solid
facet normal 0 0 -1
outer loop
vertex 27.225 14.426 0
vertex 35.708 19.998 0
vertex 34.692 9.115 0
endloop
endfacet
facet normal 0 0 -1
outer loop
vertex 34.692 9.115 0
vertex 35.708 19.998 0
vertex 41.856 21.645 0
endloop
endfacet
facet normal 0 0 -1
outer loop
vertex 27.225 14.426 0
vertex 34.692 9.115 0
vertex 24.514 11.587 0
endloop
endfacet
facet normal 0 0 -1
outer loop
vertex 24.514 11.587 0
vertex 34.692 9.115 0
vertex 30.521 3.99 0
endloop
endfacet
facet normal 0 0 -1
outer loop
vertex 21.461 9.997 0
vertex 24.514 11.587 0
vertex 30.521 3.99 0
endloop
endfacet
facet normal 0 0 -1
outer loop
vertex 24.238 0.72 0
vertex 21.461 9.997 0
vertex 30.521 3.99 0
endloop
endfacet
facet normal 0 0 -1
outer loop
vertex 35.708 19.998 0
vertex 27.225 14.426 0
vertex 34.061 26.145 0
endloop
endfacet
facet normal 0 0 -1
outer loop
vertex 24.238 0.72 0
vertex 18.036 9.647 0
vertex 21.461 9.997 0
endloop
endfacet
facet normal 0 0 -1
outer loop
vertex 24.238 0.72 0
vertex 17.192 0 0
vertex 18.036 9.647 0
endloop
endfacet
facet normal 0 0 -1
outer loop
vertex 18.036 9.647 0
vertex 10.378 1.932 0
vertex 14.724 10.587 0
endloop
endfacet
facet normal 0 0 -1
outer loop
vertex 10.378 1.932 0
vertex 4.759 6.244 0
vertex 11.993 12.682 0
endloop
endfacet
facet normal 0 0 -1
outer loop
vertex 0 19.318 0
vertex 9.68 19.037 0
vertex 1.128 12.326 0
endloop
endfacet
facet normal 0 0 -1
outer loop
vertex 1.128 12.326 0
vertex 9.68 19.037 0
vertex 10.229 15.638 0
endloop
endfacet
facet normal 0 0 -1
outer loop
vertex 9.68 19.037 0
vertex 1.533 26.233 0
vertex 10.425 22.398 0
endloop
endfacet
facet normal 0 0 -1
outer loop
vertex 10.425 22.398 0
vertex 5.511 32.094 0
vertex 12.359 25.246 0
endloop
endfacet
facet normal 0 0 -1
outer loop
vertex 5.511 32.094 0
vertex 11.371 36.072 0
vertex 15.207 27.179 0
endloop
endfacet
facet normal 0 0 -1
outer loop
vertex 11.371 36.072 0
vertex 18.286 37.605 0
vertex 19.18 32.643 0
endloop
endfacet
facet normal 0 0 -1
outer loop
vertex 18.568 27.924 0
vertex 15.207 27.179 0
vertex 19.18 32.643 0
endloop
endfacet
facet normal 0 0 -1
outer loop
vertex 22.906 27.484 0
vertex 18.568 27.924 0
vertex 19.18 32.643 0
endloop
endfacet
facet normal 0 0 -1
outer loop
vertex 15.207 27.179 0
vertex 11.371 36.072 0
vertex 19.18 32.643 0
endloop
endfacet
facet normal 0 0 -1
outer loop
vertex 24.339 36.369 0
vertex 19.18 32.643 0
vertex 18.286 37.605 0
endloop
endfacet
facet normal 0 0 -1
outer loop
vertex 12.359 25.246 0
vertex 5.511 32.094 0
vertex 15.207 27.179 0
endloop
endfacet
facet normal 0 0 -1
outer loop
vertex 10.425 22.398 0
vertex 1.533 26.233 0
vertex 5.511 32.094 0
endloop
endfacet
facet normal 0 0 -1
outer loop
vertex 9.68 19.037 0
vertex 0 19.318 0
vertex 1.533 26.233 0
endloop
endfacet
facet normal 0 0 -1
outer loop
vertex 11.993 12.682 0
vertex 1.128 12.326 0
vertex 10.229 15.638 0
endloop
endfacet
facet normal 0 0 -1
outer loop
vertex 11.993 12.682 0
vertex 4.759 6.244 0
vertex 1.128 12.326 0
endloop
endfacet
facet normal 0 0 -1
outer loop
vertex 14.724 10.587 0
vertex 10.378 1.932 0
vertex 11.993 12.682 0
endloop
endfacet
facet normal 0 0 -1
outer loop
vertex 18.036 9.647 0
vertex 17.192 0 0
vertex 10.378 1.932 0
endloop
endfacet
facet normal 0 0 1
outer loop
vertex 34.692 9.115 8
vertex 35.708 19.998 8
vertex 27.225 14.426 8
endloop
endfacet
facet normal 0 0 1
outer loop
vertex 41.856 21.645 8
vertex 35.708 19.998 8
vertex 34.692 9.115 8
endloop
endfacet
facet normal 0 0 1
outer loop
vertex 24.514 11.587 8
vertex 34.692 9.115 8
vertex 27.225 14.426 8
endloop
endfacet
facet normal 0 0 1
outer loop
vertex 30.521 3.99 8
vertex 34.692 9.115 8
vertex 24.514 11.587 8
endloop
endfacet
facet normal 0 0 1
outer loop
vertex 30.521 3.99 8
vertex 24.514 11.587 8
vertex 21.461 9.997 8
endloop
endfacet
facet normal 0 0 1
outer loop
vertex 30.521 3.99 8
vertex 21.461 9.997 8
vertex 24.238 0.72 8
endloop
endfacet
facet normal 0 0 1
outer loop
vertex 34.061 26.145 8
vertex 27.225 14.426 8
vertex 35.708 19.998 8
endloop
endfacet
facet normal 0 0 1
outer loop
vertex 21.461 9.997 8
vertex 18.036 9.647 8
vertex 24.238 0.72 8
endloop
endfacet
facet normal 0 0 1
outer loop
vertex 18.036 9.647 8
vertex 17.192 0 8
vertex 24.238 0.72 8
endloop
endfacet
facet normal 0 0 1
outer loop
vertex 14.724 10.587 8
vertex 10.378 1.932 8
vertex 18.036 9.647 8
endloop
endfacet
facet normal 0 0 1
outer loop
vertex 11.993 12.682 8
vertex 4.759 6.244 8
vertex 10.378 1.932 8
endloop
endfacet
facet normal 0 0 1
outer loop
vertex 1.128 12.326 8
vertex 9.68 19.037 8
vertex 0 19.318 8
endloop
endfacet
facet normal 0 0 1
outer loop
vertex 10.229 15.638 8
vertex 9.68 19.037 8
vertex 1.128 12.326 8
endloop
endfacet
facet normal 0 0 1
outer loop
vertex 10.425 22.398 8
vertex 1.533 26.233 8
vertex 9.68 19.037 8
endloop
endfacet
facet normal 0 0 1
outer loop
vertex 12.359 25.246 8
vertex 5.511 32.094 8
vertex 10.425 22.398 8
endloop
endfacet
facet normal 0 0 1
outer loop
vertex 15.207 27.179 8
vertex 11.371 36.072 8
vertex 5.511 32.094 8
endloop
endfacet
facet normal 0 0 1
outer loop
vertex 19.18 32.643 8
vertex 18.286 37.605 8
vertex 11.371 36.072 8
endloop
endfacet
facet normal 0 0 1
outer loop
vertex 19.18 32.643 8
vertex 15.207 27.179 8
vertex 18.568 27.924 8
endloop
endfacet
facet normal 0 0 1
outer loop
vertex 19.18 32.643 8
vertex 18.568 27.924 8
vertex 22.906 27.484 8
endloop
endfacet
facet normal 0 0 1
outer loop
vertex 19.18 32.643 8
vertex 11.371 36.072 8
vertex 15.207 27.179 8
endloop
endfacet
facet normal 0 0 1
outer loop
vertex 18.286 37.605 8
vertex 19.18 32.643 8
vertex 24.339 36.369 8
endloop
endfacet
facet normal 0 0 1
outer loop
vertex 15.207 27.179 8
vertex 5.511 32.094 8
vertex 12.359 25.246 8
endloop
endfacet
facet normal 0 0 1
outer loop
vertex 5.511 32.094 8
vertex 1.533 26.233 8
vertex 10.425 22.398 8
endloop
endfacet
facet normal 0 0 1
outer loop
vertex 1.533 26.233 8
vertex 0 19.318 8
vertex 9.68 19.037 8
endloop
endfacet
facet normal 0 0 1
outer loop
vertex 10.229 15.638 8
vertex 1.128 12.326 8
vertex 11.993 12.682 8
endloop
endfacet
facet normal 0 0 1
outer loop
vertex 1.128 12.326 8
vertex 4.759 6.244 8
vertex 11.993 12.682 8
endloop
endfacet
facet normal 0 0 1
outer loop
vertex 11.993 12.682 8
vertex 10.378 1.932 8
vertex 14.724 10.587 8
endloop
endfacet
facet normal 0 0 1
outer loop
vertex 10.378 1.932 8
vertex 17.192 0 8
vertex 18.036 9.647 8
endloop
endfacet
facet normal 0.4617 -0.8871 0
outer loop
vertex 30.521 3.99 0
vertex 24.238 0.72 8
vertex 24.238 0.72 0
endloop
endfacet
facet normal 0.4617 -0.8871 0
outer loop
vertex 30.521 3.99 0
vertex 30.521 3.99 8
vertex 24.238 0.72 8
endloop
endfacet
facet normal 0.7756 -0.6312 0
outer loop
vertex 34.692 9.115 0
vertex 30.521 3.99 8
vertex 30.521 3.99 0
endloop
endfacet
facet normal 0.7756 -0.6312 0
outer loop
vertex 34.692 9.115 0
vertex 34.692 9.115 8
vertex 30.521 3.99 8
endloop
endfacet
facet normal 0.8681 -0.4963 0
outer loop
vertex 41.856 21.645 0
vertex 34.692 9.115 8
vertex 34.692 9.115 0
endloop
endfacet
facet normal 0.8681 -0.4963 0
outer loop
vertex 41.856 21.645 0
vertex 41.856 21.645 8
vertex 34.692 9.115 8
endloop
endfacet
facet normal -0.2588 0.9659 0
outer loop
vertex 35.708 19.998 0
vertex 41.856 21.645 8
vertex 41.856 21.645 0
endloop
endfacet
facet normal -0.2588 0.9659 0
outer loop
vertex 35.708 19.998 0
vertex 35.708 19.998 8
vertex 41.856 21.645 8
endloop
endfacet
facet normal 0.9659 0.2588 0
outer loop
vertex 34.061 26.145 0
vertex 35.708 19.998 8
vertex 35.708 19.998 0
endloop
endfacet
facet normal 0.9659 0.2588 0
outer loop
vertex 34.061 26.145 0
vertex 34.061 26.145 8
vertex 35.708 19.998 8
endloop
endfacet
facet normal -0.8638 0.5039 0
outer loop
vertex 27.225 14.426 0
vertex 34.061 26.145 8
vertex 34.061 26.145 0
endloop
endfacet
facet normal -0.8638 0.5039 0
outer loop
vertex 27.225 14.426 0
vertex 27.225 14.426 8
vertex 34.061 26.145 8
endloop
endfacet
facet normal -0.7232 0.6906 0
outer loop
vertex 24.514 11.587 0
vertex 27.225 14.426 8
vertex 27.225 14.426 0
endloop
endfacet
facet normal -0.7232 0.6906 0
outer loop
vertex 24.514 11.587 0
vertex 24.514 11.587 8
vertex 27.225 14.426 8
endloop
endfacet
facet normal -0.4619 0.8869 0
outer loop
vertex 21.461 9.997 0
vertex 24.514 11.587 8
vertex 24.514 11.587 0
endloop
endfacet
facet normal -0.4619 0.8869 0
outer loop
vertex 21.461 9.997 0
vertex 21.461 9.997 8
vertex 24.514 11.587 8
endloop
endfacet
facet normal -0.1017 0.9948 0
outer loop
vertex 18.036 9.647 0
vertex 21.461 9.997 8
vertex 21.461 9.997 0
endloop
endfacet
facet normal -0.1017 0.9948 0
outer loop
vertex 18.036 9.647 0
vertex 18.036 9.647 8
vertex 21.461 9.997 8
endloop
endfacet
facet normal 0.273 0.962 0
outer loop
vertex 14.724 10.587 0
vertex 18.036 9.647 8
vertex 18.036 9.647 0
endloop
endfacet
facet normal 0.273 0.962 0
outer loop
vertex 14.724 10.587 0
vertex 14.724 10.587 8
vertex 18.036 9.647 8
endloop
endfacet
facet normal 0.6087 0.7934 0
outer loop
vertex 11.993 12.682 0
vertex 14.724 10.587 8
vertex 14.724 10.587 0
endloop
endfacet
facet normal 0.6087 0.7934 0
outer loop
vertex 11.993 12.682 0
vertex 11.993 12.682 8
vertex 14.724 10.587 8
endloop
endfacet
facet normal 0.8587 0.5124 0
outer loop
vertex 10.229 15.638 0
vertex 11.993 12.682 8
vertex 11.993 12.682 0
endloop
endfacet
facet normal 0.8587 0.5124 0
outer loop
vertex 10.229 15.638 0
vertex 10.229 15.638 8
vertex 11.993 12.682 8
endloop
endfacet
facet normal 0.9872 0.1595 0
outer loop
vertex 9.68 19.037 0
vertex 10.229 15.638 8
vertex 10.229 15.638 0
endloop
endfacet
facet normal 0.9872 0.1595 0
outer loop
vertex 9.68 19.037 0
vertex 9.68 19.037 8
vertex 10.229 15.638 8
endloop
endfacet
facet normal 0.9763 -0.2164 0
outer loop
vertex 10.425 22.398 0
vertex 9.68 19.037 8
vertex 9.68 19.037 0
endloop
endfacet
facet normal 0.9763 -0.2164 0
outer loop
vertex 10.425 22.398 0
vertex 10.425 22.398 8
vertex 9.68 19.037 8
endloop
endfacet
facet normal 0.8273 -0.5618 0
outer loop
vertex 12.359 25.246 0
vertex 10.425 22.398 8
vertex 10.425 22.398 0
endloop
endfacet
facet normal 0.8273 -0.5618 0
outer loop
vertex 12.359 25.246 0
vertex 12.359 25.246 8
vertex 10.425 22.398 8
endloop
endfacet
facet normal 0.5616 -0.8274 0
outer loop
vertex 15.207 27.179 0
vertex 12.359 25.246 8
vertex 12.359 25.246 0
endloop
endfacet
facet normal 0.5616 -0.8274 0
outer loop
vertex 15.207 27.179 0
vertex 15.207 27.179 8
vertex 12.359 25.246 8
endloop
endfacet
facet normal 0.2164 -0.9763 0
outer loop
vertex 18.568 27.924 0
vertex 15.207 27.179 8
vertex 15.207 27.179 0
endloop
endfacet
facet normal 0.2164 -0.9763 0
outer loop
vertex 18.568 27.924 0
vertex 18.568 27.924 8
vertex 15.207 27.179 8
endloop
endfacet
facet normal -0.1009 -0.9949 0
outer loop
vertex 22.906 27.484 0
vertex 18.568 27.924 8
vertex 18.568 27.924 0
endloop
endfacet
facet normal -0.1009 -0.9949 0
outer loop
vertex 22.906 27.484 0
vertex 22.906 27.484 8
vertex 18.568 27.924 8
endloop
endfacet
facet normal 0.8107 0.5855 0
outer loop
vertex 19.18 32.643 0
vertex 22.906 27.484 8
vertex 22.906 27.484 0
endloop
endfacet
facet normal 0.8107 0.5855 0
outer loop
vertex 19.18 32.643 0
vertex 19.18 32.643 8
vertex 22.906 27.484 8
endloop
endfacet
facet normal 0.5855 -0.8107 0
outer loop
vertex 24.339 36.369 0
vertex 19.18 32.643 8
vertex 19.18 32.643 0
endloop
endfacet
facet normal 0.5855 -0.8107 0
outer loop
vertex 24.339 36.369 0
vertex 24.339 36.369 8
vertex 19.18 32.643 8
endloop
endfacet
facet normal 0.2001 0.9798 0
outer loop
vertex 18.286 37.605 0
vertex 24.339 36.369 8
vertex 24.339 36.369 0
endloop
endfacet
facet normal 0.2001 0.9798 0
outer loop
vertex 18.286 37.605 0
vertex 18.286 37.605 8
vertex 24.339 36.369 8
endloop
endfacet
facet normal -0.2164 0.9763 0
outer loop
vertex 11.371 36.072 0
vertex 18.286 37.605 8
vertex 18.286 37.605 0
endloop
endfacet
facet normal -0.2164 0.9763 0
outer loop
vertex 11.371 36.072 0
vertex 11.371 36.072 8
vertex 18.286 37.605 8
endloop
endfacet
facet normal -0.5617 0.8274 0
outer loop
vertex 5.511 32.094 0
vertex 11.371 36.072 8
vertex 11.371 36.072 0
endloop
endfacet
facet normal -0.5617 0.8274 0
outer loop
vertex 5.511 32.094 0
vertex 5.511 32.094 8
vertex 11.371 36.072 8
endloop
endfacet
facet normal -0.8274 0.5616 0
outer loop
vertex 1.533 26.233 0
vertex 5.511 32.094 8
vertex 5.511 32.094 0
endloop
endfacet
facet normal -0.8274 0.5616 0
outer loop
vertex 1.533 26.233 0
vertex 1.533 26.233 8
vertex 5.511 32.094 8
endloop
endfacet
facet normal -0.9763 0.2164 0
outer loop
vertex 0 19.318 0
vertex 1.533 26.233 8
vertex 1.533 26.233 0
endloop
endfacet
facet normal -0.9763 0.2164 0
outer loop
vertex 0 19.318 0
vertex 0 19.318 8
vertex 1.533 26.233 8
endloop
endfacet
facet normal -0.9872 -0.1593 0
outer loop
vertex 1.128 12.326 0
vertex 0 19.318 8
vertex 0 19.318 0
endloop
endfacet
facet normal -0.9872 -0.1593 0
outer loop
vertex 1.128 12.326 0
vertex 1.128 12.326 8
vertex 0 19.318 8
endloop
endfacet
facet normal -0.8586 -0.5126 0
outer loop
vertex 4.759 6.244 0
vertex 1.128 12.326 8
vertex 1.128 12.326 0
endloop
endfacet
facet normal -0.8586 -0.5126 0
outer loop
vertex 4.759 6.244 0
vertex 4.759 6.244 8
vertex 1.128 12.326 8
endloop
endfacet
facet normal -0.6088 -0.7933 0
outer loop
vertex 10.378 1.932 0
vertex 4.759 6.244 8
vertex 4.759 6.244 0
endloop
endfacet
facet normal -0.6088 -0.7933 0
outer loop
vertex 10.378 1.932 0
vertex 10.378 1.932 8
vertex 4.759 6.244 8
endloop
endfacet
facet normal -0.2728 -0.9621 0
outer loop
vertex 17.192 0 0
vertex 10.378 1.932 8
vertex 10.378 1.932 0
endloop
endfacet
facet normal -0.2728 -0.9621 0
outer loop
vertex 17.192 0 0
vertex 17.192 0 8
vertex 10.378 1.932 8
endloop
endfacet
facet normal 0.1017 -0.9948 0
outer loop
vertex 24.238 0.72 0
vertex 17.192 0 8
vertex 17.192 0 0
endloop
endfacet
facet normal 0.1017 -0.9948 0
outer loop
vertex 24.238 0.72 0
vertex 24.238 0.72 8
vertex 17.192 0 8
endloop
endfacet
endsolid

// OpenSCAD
$fn = 32;

// ----------------------------------------------------------------------
// Eye lug: ring_tail, 8 mm thick
// ----------------------------------------------------------------------

// --- parameters (mm) ---
profile_height = 8;       // extrusion height
profile_points = 30;      // points of the closed outline

profile = [[19.18, 32.643], [24.339, 36.369], [18.286, 37.605], [11.371, 36.072], [5.511, 32.094], [1.533, 26.233], [0, 19.318], [1.128, 12.326], [4.759, 6.244], [10.378, 1.932], [17.192, 0], [24.238, 0.72], [30.521, 3.99], [34.692, 9.115], [41.856, 21.645], [35.708, 19.998], [34.061, 26.145], [27.225, 14.426], [24.514, 11.587], [21.461, 9.997], [18.036, 9.647], [14.724, 10.587], [11.993, 12.682], [10.229, 15.638], [9.68, 19.037], [10.425, 22.398], [12.359, 25.246], [15.207, 27.179], [18.568, 27.924], [22.906, 27.484]];  // single closed polygon, 30 points, counter clockwise

// --- the one profile operation ---
linear_extrude(height = profile_height) polygon(points = profile);
